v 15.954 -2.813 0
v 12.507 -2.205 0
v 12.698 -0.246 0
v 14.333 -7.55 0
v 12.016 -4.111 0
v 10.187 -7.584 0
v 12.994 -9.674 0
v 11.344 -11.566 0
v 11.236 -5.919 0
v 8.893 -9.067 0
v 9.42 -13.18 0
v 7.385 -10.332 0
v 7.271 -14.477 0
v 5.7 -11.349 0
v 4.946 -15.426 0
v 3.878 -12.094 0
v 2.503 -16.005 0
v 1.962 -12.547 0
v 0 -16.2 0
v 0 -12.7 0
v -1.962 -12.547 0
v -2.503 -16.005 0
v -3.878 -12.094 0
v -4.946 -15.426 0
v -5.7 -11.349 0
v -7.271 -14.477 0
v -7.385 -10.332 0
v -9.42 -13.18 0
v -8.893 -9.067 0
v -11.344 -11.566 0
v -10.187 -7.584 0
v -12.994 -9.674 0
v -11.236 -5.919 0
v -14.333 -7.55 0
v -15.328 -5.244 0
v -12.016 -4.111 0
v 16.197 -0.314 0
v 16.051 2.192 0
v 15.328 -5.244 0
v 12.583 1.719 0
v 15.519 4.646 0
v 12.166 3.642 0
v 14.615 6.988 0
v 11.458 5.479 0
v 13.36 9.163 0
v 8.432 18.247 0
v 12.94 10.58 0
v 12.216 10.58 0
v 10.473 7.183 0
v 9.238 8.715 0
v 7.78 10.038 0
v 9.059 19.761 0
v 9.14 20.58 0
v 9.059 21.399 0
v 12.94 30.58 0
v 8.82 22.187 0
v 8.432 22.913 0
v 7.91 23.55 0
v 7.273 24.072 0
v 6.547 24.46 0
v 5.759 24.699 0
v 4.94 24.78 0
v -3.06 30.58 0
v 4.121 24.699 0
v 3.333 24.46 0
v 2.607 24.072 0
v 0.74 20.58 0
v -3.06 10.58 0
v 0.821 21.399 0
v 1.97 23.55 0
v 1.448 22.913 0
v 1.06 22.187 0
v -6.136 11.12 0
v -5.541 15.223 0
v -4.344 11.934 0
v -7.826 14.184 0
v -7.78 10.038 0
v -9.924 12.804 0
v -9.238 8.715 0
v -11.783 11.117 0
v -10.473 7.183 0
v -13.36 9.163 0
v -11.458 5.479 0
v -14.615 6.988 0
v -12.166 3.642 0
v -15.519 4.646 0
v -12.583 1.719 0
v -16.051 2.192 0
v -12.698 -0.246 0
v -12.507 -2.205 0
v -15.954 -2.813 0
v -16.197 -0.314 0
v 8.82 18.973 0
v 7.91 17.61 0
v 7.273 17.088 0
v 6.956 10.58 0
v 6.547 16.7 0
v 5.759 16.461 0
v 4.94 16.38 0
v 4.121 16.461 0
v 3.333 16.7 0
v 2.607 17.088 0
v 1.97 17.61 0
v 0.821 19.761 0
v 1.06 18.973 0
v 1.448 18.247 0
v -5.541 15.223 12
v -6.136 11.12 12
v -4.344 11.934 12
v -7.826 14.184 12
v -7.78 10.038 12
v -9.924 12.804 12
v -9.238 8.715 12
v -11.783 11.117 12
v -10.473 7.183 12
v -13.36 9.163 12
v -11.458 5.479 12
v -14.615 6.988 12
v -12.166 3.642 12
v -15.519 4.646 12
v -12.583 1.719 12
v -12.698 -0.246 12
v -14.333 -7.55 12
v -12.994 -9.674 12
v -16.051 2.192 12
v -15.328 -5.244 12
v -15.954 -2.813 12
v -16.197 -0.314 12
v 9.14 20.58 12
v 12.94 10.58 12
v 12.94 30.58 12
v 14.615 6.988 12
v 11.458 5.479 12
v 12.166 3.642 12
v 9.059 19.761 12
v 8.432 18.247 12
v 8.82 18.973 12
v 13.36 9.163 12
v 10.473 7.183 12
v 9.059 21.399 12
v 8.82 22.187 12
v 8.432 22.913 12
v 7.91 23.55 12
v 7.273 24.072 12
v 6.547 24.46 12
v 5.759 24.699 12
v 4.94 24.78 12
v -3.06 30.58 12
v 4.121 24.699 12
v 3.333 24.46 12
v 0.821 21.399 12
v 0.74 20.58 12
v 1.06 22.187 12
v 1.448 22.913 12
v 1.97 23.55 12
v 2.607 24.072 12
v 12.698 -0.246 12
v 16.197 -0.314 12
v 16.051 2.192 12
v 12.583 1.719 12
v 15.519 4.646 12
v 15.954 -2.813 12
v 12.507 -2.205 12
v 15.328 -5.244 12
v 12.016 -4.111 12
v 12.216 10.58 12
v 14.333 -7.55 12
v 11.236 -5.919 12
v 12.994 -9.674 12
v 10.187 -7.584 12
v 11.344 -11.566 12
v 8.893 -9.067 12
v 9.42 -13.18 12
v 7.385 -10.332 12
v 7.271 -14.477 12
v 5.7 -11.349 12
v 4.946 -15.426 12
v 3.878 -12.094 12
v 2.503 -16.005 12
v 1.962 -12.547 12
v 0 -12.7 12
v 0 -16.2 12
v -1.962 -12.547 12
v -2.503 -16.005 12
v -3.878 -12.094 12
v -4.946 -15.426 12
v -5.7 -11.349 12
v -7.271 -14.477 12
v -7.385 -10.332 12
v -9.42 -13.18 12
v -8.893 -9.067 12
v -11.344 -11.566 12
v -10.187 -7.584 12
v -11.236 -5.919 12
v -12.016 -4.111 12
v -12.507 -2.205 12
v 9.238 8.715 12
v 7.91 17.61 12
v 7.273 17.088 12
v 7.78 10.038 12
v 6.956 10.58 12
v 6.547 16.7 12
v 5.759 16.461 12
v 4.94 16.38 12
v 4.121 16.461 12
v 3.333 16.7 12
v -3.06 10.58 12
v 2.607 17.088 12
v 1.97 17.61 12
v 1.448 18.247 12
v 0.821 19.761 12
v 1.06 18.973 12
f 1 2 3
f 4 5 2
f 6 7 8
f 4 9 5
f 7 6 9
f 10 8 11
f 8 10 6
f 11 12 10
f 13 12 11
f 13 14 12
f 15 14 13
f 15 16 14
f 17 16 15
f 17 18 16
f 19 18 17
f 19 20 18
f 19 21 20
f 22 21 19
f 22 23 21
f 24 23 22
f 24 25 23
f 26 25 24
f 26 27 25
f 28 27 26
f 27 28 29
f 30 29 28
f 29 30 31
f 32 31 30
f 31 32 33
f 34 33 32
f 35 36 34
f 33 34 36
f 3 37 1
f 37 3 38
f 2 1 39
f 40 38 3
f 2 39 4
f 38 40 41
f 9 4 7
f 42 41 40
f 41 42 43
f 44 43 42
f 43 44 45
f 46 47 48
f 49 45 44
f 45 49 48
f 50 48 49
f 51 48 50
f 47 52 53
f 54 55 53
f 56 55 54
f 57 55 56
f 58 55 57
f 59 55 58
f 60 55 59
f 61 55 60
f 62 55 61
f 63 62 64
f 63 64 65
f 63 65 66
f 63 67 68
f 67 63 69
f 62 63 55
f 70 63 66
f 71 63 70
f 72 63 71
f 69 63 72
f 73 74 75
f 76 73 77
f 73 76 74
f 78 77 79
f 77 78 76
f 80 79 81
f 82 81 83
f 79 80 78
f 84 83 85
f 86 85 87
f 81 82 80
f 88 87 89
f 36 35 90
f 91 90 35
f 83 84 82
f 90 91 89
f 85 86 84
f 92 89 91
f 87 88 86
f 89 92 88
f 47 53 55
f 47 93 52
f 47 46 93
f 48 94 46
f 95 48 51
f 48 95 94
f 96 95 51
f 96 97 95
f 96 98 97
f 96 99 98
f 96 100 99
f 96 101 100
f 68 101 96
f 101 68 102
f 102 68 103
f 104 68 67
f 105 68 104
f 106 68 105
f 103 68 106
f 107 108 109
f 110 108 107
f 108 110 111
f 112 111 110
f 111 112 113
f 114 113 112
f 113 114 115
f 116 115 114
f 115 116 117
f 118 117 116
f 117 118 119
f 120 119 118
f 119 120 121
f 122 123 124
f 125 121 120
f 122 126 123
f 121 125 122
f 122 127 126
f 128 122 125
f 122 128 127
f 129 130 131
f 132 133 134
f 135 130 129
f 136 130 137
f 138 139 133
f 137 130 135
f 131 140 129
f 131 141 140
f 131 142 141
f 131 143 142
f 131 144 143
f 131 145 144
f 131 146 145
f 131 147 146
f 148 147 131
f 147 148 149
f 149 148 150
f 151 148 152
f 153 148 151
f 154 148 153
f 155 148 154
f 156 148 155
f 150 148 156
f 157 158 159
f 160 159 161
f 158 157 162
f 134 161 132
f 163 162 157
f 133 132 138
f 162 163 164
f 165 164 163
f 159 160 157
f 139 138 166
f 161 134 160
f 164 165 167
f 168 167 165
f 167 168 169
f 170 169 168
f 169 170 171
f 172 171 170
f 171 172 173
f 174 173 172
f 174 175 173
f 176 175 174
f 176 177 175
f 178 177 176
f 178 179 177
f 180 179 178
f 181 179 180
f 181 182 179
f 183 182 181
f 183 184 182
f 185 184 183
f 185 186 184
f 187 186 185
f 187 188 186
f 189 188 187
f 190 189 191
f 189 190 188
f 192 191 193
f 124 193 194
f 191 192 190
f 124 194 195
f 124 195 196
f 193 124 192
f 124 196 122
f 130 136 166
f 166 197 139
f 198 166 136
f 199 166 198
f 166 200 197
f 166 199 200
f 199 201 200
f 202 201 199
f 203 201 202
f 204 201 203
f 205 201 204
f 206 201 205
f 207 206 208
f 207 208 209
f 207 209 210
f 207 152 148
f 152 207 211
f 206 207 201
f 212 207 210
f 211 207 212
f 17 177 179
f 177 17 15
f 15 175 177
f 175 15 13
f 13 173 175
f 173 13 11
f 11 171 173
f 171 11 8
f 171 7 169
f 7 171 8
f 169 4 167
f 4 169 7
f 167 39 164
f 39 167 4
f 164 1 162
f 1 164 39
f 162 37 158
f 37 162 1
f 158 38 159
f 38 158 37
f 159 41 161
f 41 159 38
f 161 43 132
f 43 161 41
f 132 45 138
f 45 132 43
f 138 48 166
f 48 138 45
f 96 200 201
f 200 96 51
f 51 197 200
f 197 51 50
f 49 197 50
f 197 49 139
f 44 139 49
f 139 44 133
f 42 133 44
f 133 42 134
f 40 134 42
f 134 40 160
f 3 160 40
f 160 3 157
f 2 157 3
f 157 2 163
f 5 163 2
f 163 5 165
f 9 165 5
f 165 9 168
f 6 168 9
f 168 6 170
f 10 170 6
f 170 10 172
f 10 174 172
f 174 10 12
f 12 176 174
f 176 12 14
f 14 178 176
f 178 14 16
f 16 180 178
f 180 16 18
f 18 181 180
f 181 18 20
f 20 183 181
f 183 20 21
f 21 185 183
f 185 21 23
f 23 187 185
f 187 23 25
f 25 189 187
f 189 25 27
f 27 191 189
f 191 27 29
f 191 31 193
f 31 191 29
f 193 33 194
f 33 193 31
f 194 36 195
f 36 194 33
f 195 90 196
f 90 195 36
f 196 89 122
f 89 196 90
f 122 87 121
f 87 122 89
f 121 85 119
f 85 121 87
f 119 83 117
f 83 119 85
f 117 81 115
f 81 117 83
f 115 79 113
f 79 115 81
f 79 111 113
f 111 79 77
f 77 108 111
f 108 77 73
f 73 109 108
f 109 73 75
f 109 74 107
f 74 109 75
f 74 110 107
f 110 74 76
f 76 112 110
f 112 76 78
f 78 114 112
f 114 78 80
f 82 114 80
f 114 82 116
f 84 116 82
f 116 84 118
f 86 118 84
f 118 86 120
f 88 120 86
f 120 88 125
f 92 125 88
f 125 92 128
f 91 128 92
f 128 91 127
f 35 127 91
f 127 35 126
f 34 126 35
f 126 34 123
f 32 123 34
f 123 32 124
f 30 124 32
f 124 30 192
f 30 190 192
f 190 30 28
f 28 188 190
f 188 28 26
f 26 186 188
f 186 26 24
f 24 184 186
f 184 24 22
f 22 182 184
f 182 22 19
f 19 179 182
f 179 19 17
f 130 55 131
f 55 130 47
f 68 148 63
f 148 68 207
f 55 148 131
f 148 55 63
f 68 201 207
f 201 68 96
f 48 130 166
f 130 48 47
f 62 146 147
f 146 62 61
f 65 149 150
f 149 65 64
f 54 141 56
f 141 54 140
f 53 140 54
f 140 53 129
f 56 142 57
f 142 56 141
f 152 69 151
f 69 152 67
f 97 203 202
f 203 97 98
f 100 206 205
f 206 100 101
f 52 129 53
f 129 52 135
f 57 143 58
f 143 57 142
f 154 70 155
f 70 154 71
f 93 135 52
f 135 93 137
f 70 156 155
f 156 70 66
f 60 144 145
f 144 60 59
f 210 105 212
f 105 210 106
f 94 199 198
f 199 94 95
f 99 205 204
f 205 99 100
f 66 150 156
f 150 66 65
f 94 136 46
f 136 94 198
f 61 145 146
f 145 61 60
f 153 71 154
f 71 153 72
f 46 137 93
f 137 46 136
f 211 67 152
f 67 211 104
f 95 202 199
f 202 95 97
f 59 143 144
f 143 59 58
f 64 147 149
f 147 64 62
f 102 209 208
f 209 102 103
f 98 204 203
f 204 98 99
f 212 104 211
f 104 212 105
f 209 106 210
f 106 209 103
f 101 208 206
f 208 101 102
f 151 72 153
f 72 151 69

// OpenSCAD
$fn = 32;

// ----------------------------------------------------------------------
// Pipe clamp: 32.4 mm ring, 3.5 mm wall, 12 mm wide
// ----------------------------------------------------------------------

// --- parameters (mm) ---
outer_r = 16.2;           // clamp outside radius
inner_r = 12.7;           // pipe bore radius
band = 3.5;               // band thickness
clamp_w = 12;             // clamp width
opening = 40;             // opening angle between the ends
lug_w = 16;               // lug width
lug_len = 20;             // lug length
bolt_d = 8.4;             // bolt hole

clamp_profile = [[-5.541, 15.223], [-7.826, 14.184], [-9.924, 12.804], [-11.783, 11.117], [-13.36, 9.163], [-14.615, 6.988], [-15.519, 4.646], [-16.051, 2.192], [-16.197, -0.314], [-15.954, -2.813], [-15.328, -5.244], [-14.333, -7.55], [-12.994, -9.674], [-11.344, -11.566], [-9.42, -13.18], [-7.271, -14.477], [-4.946, -15.426], [-2.503, -16.005], [0, -16.2], [2.503, -16.005], [4.946, -15.426], [7.271, -14.477], [9.42, -13.18], [11.344, -11.566], [12.994, -9.674], [14.333, -7.55], [15.328, -5.244], [15.954, -2.813], [16.197, -0.314], [16.051, 2.192], [15.519, 4.646], [14.615, 6.988], [13.36, 9.163], [11.783, 11.117], [9.924, 12.804], [7.826, 14.184], [5.541, 15.223], [4.344, 11.934], [6.136, 11.12], [7.78, 10.038], [9.238, 8.715], [10.473, 7.183], [11.458, 5.479], [12.166, 3.642], [12.583, 1.719], [12.698, -0.246], [12.507, -2.205], [12.016, -4.111], [11.236, -5.919], [10.187, -7.584], [8.893, -9.067], [7.385, -10.332], [5.7, -11.349], [3.878, -12.094], [1.962, -12.547], [0, -12.7], [-1.962, -12.547], [-3.878, -12.094], [-5.7, -11.349], [-7.385, -10.332], [-8.893, -9.067], [-10.187, -7.584], [-11.236, -5.919], [-12.016, -4.111], [-12.507, -2.205], [-12.698, -0.246], [-12.583, 1.719], [-12.166, 3.642], [-11.458, 5.479], [-10.473, 7.183], [-9.238, 8.715], [-7.78, 10.038], [-6.136, 11.12], [-4.344, 11.934]];

difference() {
  union() {
    linear_extrude(height = clamp_w) polygon(clamp_profile);
    /* bolt lug on the other end */
    translate([-3.06, 10.58, 0]) cube([lug_w, 20, clamp_w]);
  }
  translate([4.94, 20.58, -2.5]) cylinder(h = clamp_w + 5, d = bolt_d);
}
